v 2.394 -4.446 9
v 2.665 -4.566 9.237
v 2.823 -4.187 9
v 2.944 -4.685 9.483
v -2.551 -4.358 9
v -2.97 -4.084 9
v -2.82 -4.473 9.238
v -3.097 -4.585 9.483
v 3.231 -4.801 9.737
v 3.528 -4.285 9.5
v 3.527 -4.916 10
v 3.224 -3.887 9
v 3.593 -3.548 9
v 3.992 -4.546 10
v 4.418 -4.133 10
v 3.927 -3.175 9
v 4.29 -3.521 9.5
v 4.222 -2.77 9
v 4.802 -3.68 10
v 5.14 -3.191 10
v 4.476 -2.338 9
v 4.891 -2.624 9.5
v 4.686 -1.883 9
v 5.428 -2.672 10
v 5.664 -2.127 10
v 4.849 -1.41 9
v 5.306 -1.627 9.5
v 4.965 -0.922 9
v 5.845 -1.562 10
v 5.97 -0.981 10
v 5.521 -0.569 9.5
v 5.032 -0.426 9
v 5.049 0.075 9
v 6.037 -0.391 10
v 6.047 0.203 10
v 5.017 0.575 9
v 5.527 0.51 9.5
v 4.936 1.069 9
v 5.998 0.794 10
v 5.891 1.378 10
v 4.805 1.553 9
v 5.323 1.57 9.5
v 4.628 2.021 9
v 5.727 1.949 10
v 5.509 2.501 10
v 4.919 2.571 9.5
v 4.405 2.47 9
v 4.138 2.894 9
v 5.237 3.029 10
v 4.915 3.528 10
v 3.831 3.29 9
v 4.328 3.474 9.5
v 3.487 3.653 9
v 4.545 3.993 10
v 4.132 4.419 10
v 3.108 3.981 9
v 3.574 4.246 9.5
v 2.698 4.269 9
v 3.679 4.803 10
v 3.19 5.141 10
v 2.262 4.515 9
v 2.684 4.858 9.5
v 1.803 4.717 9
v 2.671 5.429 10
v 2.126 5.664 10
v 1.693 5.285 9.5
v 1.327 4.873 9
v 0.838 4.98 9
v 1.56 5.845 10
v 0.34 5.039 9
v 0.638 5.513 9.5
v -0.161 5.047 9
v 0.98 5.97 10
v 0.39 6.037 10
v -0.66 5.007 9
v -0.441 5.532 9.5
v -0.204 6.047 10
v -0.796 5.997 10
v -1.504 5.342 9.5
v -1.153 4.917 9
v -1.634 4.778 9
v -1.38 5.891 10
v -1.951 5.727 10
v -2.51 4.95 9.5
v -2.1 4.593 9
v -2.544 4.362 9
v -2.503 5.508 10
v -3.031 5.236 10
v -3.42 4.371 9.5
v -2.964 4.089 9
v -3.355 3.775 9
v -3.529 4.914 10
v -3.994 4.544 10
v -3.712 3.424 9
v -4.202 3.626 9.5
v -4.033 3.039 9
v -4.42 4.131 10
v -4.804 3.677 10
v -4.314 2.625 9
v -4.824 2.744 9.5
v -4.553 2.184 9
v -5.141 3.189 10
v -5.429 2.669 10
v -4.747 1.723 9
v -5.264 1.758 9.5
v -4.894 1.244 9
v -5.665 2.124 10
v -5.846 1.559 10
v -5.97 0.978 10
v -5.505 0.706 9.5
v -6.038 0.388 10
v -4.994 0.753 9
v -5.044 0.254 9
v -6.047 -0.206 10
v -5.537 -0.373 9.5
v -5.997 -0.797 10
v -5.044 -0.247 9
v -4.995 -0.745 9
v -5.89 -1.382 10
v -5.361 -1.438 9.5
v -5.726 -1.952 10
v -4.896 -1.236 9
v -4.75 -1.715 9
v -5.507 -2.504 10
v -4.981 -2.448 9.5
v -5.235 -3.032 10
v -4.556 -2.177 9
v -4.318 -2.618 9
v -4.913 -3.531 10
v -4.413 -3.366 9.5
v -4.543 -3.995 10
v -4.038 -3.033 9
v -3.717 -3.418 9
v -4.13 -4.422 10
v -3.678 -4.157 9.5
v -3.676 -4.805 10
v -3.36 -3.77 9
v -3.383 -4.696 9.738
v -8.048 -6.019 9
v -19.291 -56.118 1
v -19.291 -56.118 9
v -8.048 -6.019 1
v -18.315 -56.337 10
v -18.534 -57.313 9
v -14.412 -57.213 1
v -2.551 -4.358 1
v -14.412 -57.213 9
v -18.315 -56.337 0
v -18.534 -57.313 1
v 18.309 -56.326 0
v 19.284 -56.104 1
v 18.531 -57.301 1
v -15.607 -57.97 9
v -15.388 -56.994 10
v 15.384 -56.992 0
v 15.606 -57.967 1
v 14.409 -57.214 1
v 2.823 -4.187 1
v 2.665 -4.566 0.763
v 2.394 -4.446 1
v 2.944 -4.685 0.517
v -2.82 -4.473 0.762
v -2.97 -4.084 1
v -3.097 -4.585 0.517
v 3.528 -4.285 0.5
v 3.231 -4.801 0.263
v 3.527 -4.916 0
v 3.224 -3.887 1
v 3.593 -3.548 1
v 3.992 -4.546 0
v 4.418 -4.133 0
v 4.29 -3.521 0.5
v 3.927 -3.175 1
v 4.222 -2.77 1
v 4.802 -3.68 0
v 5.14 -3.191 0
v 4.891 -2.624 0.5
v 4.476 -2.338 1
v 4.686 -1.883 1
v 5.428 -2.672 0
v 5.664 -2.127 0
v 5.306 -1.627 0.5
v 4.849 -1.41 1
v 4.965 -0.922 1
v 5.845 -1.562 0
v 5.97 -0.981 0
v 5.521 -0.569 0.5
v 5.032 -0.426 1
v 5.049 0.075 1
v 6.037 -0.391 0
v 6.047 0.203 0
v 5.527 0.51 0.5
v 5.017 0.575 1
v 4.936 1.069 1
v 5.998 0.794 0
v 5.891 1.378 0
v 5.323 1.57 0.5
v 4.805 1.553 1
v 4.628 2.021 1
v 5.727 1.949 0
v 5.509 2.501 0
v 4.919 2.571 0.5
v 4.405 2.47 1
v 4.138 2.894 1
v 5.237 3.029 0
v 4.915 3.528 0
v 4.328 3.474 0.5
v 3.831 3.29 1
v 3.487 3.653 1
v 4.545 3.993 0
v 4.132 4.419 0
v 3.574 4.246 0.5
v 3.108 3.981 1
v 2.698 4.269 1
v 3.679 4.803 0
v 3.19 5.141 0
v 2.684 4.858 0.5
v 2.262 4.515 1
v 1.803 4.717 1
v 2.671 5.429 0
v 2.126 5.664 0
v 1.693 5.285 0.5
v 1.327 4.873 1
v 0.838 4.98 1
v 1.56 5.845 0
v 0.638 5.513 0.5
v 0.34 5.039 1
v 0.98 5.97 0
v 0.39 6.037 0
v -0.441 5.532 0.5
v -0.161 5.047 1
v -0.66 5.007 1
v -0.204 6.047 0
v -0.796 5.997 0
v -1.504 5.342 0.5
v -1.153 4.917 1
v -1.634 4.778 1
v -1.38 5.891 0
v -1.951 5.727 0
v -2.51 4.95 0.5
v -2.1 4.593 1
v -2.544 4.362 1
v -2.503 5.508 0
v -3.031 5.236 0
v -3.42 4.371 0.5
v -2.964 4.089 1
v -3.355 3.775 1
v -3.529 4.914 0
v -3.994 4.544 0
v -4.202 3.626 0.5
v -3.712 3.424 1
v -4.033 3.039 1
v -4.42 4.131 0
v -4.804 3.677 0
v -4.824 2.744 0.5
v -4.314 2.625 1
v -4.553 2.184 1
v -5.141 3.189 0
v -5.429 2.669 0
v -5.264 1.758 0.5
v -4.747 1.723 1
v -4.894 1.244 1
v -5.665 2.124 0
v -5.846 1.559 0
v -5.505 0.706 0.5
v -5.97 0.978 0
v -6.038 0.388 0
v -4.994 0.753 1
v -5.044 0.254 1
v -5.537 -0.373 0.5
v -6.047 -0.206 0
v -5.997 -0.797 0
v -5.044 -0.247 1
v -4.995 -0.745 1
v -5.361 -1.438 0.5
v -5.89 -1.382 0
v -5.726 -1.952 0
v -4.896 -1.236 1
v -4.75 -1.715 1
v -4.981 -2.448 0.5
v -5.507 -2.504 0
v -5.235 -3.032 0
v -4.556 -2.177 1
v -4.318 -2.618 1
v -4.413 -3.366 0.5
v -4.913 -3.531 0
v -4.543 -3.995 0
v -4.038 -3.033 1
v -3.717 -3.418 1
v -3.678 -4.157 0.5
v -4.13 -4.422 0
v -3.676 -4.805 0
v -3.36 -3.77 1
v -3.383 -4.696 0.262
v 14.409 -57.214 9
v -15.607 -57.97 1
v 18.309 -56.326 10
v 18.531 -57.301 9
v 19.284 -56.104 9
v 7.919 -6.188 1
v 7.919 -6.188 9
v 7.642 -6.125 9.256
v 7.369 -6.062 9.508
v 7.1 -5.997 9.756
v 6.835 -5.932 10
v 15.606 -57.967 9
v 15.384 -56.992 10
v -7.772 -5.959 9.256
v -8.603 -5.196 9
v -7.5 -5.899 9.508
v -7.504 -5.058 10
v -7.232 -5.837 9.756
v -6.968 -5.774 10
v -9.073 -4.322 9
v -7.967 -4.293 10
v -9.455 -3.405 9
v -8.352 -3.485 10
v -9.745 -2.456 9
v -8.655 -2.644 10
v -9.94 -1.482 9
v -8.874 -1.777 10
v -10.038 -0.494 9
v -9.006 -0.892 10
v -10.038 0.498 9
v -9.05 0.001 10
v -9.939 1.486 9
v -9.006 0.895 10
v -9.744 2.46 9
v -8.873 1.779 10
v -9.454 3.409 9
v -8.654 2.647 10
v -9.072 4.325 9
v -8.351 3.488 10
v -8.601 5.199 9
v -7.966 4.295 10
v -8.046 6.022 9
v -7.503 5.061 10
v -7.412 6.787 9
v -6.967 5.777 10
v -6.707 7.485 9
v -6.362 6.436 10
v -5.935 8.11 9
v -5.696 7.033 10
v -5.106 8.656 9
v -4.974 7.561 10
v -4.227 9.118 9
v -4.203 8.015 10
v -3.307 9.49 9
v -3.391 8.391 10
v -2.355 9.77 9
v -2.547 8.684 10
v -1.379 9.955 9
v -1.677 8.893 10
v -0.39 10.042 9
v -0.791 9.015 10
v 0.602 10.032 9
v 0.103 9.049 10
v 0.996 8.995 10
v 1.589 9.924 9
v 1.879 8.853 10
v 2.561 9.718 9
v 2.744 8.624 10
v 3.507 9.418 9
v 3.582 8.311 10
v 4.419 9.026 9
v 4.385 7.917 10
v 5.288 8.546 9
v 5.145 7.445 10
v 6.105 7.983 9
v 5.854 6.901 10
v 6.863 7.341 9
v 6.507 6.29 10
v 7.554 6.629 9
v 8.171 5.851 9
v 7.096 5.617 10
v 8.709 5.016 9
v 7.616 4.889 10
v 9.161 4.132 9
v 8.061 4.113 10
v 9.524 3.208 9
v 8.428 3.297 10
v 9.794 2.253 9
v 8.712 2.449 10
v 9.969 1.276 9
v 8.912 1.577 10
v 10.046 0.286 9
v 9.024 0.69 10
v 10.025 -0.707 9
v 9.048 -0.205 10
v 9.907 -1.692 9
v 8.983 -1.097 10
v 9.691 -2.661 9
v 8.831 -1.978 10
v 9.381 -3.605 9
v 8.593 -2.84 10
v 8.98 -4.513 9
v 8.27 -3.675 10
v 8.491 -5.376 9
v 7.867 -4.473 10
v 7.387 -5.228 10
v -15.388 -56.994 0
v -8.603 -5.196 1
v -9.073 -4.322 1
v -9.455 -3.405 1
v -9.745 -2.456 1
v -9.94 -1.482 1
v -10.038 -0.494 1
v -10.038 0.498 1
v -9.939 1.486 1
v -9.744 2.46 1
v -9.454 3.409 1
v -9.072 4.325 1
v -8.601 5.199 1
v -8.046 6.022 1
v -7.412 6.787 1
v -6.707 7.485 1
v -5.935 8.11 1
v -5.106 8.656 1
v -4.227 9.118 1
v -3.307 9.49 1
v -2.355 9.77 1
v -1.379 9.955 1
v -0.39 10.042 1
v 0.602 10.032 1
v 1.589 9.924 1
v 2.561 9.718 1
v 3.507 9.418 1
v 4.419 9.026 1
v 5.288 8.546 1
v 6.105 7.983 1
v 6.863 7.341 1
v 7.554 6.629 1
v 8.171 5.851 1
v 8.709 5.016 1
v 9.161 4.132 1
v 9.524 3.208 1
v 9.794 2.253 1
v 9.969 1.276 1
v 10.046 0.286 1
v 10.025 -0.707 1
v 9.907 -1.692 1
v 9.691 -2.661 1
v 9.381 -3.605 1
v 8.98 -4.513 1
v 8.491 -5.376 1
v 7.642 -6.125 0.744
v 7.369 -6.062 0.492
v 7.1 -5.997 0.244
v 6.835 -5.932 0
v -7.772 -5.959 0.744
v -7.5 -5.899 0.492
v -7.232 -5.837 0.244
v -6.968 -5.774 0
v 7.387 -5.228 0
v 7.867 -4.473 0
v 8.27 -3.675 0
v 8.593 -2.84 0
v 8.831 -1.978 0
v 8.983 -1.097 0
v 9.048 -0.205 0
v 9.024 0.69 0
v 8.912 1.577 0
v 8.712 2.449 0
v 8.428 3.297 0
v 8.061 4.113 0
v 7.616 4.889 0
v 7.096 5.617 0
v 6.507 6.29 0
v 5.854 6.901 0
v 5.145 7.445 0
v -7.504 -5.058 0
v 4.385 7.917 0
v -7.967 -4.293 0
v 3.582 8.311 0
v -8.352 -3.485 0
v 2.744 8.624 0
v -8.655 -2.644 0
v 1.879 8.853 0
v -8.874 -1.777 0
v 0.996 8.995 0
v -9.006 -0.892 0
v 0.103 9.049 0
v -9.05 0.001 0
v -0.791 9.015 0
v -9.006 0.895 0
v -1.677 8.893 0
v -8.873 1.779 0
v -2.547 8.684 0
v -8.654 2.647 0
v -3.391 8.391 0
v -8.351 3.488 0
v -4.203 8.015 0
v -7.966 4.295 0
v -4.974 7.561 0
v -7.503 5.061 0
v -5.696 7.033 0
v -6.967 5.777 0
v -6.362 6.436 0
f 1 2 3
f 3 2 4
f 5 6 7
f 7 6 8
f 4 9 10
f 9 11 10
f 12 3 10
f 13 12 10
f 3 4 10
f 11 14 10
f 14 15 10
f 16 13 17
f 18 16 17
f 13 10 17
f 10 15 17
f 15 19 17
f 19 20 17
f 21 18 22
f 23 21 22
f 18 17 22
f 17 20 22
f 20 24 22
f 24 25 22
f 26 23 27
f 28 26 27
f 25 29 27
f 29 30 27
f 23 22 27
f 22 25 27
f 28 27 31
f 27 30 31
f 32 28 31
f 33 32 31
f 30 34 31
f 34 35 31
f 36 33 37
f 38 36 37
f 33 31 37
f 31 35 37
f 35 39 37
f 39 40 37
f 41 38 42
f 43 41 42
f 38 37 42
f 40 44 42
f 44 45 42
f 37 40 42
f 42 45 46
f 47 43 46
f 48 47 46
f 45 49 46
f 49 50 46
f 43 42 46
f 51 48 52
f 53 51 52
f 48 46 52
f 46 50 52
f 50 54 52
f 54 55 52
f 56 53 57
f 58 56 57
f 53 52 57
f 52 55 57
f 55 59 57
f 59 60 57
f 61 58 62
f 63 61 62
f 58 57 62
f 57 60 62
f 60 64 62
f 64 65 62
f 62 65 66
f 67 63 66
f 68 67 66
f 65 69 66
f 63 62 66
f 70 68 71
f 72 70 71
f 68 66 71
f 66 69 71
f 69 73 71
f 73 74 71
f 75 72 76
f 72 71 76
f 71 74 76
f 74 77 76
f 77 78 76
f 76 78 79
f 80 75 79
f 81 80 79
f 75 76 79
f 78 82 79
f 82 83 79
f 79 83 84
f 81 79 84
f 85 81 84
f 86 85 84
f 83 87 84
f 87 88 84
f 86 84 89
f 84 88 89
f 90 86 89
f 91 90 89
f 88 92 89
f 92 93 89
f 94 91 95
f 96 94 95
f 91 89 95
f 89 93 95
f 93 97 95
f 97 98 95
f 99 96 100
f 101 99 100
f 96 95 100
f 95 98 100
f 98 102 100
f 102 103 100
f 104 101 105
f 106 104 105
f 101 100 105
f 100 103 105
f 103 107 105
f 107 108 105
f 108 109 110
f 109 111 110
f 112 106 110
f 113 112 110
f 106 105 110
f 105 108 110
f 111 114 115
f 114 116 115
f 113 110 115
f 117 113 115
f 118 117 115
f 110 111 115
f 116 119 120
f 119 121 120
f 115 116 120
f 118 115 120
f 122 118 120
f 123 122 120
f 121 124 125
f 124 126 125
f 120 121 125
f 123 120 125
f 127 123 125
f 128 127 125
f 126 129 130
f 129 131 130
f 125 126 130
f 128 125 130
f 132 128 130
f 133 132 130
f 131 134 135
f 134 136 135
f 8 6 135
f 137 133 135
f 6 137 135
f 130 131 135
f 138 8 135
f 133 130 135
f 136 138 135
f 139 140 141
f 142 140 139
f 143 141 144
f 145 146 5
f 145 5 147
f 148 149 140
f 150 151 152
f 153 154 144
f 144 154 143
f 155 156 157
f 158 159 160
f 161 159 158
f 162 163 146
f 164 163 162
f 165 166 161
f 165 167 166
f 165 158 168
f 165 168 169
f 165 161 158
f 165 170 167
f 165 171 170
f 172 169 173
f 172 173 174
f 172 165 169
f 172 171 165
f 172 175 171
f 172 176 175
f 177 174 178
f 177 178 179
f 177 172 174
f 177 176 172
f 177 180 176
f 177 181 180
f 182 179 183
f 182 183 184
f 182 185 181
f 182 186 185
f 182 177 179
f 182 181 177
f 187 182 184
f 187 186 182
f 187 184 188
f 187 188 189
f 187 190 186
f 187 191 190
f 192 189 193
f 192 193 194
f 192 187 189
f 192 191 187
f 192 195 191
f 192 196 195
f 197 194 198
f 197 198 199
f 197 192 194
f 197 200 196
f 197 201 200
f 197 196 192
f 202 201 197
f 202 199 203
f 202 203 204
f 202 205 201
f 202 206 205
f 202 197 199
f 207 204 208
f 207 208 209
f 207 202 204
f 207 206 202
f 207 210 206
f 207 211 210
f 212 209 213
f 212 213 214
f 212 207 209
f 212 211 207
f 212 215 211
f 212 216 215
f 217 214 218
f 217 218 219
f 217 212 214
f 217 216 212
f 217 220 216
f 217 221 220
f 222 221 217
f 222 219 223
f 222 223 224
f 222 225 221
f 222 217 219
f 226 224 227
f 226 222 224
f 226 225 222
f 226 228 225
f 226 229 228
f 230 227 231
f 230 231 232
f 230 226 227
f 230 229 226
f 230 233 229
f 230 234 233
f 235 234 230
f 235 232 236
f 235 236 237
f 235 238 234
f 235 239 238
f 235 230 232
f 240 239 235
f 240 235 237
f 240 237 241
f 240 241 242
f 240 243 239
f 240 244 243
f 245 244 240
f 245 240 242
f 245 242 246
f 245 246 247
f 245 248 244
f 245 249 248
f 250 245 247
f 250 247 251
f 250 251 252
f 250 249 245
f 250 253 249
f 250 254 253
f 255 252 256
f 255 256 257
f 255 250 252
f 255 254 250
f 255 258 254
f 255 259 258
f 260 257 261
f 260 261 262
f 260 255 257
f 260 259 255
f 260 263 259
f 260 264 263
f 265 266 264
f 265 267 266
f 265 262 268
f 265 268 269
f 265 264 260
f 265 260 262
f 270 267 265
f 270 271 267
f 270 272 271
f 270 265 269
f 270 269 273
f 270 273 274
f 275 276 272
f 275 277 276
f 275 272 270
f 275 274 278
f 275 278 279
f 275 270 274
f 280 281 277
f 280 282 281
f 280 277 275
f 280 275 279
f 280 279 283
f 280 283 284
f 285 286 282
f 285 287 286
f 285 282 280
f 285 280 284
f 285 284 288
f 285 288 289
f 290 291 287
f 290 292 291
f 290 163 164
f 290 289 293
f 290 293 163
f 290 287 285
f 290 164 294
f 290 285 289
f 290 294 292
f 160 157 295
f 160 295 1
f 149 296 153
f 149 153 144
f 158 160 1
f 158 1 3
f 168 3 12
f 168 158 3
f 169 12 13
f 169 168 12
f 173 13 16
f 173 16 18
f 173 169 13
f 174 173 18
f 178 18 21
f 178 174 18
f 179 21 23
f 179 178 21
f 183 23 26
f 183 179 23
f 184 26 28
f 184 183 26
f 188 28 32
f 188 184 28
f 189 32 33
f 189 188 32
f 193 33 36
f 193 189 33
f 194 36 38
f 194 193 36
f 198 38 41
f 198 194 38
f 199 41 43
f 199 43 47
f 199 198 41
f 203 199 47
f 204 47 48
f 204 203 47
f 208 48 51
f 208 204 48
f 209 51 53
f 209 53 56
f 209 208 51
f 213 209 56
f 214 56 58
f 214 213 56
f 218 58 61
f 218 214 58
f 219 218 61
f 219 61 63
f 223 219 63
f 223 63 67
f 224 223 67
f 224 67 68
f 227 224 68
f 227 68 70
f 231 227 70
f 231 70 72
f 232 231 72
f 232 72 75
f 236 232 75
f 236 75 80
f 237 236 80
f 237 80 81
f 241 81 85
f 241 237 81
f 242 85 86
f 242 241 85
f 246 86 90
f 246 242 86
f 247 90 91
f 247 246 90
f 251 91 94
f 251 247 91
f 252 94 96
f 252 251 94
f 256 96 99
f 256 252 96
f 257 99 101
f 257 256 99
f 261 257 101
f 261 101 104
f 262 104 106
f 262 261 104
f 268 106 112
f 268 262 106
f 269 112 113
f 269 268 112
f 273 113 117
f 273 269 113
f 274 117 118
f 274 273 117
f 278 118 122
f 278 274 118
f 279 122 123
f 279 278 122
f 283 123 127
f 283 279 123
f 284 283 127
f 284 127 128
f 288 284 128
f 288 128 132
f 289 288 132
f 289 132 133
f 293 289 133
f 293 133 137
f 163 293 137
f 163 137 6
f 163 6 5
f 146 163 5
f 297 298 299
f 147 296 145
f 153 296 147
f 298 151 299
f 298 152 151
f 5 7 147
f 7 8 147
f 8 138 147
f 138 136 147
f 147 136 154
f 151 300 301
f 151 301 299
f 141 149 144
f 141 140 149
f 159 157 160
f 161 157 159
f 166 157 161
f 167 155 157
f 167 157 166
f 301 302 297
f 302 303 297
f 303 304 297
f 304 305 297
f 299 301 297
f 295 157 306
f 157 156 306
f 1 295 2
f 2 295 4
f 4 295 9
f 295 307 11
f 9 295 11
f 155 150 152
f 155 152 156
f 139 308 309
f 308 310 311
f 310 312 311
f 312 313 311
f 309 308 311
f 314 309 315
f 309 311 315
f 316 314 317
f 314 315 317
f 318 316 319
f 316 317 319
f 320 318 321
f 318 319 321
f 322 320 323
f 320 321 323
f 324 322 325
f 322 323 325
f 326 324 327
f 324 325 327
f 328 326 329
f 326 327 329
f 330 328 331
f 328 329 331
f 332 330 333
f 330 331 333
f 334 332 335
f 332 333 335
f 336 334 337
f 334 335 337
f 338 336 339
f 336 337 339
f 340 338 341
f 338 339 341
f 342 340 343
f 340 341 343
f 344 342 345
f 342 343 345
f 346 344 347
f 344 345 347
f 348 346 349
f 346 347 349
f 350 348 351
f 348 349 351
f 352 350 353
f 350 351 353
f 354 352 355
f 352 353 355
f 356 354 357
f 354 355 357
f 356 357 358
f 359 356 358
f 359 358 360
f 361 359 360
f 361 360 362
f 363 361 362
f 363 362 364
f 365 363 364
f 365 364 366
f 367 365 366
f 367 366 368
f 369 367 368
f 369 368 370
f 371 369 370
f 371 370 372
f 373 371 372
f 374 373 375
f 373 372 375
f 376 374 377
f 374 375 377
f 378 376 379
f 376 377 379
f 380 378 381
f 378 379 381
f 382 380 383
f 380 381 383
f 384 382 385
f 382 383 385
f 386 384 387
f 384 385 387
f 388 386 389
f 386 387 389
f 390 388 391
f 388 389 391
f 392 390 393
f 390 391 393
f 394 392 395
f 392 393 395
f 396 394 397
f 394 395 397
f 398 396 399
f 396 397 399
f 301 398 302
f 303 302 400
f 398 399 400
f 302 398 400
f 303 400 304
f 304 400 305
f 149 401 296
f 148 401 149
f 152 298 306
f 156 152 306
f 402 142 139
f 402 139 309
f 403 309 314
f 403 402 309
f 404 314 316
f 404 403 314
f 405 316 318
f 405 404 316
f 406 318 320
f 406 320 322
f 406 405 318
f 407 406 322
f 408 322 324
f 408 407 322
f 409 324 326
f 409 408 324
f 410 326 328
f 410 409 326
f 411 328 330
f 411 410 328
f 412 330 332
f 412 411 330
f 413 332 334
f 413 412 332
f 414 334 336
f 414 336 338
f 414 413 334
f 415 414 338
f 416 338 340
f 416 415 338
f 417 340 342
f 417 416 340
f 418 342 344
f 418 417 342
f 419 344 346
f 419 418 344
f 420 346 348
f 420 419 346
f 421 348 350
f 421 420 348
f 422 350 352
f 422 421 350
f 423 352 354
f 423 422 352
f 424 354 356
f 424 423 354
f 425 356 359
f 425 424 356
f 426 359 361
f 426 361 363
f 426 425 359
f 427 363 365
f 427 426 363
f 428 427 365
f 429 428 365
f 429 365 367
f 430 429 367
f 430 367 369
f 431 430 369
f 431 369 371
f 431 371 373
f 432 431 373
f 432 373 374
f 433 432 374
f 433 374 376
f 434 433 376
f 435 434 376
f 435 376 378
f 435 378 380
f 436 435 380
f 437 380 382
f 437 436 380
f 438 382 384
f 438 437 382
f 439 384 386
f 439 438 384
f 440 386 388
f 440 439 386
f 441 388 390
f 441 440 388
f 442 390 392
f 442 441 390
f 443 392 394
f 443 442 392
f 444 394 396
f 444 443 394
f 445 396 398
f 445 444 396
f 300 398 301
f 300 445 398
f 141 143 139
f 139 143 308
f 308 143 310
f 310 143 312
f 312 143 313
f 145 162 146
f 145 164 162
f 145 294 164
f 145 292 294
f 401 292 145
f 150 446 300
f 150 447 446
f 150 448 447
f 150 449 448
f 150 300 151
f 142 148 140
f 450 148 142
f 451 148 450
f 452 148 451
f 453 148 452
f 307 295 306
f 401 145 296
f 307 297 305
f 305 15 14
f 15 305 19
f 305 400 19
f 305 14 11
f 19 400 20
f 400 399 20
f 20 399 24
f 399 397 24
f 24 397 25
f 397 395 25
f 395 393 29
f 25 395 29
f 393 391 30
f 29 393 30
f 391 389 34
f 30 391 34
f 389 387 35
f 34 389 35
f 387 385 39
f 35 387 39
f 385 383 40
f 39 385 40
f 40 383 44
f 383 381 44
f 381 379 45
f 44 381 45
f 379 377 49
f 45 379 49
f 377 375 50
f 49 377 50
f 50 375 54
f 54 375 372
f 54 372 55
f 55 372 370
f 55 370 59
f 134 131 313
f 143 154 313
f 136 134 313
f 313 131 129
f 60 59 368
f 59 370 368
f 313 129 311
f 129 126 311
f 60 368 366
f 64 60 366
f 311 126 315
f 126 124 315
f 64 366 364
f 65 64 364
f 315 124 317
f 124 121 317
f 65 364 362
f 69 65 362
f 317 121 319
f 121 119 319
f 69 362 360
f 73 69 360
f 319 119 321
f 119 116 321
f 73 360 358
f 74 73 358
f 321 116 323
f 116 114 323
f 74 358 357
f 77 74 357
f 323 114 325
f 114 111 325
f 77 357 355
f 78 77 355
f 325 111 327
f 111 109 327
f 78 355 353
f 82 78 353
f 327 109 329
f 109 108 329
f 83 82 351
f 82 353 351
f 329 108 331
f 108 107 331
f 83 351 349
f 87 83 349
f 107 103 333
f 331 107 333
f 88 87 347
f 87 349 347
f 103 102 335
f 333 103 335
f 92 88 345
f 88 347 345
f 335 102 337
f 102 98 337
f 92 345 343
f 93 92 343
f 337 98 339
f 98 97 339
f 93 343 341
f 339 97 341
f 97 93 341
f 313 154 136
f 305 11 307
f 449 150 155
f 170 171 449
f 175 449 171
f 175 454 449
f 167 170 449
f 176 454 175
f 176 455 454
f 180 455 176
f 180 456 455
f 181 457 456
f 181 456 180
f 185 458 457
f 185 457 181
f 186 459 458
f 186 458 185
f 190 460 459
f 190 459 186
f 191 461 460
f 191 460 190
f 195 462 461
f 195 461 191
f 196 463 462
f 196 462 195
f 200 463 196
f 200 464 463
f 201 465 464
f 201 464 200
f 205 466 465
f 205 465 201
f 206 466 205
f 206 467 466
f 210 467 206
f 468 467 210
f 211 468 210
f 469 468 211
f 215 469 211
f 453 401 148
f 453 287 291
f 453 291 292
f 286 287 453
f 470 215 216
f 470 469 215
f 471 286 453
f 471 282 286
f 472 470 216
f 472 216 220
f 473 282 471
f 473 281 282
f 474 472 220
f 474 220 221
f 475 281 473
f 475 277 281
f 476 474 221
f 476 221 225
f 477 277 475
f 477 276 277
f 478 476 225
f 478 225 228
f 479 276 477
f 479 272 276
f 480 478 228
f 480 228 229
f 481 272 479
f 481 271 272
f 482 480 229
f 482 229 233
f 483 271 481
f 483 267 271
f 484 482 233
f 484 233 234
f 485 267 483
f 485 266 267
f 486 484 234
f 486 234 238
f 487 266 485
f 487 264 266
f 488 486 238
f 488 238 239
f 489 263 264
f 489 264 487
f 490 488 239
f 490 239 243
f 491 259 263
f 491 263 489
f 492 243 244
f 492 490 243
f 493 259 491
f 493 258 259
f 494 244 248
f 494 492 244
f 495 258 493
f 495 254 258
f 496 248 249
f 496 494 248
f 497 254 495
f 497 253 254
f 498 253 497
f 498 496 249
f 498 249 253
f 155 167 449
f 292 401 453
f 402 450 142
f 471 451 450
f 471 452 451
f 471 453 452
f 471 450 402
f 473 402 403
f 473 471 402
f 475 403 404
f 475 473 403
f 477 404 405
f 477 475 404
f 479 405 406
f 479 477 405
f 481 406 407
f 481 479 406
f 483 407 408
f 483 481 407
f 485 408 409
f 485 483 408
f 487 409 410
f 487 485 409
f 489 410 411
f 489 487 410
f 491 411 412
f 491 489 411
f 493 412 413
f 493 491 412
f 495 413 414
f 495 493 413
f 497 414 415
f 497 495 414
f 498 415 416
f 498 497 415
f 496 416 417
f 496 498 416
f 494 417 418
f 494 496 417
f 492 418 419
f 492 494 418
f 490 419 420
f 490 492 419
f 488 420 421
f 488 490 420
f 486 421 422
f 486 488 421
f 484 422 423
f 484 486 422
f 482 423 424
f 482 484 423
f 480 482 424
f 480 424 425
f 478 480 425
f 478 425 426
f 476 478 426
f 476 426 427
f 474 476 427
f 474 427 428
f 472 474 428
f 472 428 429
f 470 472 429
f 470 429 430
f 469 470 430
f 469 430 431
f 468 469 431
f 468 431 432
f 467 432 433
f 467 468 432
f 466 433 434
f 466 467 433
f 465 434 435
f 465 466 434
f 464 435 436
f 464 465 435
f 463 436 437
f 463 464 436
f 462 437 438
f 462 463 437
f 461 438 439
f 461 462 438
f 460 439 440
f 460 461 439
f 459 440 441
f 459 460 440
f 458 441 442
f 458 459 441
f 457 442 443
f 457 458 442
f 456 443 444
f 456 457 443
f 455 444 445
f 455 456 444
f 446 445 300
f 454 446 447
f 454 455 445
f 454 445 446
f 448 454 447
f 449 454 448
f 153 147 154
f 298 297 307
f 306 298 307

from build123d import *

# Parameters (mm, degrees)
EXTRUDE_1_DEPTH = 10
CHAMFER_1_SIZE  = 1


with BuildPart() as part:
    # 草图1 → 拉伸-薄壁1 (new body)
    with BuildSketch(Plane.XY):
        with BuildLine():
            Line((14.631143099, -58.188741623), (2.394484263, -4.446228189))
            ThreePointArc((2.394484263, -4.446228189), (0.089779865, 5.049201875), (-2.551037445, -4.358291862))
            Line((-2.551037445, -4.358291862), (-14.631143099, -58.188741623))
            Line((-14.631143099, -58.188741623), (-19.509807266, -57.09391929))
            Line((-19.509807266, -57.09391929), (-8.04810956, -6.019172079))
            ThreePointArc((-8.04810956, -6.019172079), (0.106256457, 10.049438271), (7.919038593, -6.187998688))
            Line((7.919038593, -6.187998688), (19.506366852, -57.078699572))
            Line((19.506366852, -57.078699572), (14.631143099, -58.188741623))
        make_face()
    extrude(amount=EXTRUDE_1_DEPTH)

    # 倒角1
    chamfer_1_edges = [part.edges().sort_by_distance(p)[0] for p in [
        (19.506366852, -57.078699572, 5),
        (14.631143099, -58.188741623, 5),
        (-14.631143099, -58.188741623, 5),
        (-8.591090272, -31.273516742, 10),
        (-19.509807266, -57.09391929, 5),
        (0.089779865, 5.049201875, 10),
        (8.512813681, -31.317484906, 10),
        (17.068754976, -57.633720597, 10),
        (13.712702723, -31.63334913, 10),
        (0.106256457, 10.049438271, 10),
        (-13.778958413, -31.556545684, 10),
        (0.106256457, 10.049438271, 0),
        (13.712702723, -31.63334913, 0),
        (17.068754976, -57.633720597, 0),
        (8.512813681, -31.317484906, 0),
        (0.089779865, 5.049201875, 0),
        (-17.070475183, -57.641330456, 10),
        (-8.591090272, -31.273516742, 0),
        (-17.070475183, -57.641330456, 0),
        (-13.778958413, -31.556545684, 0),
    ]]
    chamfer(chamfer_1_edges, length=CHAMFER_1_SIZE)


solid = part.part
